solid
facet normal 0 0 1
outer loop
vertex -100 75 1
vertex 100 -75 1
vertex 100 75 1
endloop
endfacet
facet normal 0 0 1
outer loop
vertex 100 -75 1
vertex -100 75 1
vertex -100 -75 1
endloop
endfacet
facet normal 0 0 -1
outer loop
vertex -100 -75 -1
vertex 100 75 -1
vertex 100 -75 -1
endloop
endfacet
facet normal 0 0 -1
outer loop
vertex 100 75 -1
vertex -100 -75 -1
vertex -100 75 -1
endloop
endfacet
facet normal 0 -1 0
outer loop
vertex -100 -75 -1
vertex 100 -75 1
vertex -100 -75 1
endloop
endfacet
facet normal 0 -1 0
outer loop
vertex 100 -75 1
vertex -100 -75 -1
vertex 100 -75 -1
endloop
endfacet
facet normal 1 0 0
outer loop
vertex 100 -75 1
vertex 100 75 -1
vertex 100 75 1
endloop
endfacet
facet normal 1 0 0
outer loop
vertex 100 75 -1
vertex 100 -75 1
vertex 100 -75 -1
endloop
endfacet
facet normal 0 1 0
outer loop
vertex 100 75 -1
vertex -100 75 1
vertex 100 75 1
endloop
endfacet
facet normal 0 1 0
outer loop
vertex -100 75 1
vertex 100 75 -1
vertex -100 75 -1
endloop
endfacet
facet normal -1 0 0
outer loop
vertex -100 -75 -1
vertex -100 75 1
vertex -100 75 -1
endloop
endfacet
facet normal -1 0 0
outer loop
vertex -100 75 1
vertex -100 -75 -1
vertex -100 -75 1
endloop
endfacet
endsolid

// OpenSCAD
// Parameters
sheet_L = 200; //[100:400:1]
sheet_W = 150; //[75:300:1]
sheet_T = 2;   //[1:4:0.5]

// Robust thickness to avoid blank/empty renders due to near-zero Z
min_T = 0.5;
t = max(sheet_T, min_T);

// Geometry (one connected solid)
color([0.85, 0.85, 0.8])
cube([sheet_L, sheet_W, t], center=true);
